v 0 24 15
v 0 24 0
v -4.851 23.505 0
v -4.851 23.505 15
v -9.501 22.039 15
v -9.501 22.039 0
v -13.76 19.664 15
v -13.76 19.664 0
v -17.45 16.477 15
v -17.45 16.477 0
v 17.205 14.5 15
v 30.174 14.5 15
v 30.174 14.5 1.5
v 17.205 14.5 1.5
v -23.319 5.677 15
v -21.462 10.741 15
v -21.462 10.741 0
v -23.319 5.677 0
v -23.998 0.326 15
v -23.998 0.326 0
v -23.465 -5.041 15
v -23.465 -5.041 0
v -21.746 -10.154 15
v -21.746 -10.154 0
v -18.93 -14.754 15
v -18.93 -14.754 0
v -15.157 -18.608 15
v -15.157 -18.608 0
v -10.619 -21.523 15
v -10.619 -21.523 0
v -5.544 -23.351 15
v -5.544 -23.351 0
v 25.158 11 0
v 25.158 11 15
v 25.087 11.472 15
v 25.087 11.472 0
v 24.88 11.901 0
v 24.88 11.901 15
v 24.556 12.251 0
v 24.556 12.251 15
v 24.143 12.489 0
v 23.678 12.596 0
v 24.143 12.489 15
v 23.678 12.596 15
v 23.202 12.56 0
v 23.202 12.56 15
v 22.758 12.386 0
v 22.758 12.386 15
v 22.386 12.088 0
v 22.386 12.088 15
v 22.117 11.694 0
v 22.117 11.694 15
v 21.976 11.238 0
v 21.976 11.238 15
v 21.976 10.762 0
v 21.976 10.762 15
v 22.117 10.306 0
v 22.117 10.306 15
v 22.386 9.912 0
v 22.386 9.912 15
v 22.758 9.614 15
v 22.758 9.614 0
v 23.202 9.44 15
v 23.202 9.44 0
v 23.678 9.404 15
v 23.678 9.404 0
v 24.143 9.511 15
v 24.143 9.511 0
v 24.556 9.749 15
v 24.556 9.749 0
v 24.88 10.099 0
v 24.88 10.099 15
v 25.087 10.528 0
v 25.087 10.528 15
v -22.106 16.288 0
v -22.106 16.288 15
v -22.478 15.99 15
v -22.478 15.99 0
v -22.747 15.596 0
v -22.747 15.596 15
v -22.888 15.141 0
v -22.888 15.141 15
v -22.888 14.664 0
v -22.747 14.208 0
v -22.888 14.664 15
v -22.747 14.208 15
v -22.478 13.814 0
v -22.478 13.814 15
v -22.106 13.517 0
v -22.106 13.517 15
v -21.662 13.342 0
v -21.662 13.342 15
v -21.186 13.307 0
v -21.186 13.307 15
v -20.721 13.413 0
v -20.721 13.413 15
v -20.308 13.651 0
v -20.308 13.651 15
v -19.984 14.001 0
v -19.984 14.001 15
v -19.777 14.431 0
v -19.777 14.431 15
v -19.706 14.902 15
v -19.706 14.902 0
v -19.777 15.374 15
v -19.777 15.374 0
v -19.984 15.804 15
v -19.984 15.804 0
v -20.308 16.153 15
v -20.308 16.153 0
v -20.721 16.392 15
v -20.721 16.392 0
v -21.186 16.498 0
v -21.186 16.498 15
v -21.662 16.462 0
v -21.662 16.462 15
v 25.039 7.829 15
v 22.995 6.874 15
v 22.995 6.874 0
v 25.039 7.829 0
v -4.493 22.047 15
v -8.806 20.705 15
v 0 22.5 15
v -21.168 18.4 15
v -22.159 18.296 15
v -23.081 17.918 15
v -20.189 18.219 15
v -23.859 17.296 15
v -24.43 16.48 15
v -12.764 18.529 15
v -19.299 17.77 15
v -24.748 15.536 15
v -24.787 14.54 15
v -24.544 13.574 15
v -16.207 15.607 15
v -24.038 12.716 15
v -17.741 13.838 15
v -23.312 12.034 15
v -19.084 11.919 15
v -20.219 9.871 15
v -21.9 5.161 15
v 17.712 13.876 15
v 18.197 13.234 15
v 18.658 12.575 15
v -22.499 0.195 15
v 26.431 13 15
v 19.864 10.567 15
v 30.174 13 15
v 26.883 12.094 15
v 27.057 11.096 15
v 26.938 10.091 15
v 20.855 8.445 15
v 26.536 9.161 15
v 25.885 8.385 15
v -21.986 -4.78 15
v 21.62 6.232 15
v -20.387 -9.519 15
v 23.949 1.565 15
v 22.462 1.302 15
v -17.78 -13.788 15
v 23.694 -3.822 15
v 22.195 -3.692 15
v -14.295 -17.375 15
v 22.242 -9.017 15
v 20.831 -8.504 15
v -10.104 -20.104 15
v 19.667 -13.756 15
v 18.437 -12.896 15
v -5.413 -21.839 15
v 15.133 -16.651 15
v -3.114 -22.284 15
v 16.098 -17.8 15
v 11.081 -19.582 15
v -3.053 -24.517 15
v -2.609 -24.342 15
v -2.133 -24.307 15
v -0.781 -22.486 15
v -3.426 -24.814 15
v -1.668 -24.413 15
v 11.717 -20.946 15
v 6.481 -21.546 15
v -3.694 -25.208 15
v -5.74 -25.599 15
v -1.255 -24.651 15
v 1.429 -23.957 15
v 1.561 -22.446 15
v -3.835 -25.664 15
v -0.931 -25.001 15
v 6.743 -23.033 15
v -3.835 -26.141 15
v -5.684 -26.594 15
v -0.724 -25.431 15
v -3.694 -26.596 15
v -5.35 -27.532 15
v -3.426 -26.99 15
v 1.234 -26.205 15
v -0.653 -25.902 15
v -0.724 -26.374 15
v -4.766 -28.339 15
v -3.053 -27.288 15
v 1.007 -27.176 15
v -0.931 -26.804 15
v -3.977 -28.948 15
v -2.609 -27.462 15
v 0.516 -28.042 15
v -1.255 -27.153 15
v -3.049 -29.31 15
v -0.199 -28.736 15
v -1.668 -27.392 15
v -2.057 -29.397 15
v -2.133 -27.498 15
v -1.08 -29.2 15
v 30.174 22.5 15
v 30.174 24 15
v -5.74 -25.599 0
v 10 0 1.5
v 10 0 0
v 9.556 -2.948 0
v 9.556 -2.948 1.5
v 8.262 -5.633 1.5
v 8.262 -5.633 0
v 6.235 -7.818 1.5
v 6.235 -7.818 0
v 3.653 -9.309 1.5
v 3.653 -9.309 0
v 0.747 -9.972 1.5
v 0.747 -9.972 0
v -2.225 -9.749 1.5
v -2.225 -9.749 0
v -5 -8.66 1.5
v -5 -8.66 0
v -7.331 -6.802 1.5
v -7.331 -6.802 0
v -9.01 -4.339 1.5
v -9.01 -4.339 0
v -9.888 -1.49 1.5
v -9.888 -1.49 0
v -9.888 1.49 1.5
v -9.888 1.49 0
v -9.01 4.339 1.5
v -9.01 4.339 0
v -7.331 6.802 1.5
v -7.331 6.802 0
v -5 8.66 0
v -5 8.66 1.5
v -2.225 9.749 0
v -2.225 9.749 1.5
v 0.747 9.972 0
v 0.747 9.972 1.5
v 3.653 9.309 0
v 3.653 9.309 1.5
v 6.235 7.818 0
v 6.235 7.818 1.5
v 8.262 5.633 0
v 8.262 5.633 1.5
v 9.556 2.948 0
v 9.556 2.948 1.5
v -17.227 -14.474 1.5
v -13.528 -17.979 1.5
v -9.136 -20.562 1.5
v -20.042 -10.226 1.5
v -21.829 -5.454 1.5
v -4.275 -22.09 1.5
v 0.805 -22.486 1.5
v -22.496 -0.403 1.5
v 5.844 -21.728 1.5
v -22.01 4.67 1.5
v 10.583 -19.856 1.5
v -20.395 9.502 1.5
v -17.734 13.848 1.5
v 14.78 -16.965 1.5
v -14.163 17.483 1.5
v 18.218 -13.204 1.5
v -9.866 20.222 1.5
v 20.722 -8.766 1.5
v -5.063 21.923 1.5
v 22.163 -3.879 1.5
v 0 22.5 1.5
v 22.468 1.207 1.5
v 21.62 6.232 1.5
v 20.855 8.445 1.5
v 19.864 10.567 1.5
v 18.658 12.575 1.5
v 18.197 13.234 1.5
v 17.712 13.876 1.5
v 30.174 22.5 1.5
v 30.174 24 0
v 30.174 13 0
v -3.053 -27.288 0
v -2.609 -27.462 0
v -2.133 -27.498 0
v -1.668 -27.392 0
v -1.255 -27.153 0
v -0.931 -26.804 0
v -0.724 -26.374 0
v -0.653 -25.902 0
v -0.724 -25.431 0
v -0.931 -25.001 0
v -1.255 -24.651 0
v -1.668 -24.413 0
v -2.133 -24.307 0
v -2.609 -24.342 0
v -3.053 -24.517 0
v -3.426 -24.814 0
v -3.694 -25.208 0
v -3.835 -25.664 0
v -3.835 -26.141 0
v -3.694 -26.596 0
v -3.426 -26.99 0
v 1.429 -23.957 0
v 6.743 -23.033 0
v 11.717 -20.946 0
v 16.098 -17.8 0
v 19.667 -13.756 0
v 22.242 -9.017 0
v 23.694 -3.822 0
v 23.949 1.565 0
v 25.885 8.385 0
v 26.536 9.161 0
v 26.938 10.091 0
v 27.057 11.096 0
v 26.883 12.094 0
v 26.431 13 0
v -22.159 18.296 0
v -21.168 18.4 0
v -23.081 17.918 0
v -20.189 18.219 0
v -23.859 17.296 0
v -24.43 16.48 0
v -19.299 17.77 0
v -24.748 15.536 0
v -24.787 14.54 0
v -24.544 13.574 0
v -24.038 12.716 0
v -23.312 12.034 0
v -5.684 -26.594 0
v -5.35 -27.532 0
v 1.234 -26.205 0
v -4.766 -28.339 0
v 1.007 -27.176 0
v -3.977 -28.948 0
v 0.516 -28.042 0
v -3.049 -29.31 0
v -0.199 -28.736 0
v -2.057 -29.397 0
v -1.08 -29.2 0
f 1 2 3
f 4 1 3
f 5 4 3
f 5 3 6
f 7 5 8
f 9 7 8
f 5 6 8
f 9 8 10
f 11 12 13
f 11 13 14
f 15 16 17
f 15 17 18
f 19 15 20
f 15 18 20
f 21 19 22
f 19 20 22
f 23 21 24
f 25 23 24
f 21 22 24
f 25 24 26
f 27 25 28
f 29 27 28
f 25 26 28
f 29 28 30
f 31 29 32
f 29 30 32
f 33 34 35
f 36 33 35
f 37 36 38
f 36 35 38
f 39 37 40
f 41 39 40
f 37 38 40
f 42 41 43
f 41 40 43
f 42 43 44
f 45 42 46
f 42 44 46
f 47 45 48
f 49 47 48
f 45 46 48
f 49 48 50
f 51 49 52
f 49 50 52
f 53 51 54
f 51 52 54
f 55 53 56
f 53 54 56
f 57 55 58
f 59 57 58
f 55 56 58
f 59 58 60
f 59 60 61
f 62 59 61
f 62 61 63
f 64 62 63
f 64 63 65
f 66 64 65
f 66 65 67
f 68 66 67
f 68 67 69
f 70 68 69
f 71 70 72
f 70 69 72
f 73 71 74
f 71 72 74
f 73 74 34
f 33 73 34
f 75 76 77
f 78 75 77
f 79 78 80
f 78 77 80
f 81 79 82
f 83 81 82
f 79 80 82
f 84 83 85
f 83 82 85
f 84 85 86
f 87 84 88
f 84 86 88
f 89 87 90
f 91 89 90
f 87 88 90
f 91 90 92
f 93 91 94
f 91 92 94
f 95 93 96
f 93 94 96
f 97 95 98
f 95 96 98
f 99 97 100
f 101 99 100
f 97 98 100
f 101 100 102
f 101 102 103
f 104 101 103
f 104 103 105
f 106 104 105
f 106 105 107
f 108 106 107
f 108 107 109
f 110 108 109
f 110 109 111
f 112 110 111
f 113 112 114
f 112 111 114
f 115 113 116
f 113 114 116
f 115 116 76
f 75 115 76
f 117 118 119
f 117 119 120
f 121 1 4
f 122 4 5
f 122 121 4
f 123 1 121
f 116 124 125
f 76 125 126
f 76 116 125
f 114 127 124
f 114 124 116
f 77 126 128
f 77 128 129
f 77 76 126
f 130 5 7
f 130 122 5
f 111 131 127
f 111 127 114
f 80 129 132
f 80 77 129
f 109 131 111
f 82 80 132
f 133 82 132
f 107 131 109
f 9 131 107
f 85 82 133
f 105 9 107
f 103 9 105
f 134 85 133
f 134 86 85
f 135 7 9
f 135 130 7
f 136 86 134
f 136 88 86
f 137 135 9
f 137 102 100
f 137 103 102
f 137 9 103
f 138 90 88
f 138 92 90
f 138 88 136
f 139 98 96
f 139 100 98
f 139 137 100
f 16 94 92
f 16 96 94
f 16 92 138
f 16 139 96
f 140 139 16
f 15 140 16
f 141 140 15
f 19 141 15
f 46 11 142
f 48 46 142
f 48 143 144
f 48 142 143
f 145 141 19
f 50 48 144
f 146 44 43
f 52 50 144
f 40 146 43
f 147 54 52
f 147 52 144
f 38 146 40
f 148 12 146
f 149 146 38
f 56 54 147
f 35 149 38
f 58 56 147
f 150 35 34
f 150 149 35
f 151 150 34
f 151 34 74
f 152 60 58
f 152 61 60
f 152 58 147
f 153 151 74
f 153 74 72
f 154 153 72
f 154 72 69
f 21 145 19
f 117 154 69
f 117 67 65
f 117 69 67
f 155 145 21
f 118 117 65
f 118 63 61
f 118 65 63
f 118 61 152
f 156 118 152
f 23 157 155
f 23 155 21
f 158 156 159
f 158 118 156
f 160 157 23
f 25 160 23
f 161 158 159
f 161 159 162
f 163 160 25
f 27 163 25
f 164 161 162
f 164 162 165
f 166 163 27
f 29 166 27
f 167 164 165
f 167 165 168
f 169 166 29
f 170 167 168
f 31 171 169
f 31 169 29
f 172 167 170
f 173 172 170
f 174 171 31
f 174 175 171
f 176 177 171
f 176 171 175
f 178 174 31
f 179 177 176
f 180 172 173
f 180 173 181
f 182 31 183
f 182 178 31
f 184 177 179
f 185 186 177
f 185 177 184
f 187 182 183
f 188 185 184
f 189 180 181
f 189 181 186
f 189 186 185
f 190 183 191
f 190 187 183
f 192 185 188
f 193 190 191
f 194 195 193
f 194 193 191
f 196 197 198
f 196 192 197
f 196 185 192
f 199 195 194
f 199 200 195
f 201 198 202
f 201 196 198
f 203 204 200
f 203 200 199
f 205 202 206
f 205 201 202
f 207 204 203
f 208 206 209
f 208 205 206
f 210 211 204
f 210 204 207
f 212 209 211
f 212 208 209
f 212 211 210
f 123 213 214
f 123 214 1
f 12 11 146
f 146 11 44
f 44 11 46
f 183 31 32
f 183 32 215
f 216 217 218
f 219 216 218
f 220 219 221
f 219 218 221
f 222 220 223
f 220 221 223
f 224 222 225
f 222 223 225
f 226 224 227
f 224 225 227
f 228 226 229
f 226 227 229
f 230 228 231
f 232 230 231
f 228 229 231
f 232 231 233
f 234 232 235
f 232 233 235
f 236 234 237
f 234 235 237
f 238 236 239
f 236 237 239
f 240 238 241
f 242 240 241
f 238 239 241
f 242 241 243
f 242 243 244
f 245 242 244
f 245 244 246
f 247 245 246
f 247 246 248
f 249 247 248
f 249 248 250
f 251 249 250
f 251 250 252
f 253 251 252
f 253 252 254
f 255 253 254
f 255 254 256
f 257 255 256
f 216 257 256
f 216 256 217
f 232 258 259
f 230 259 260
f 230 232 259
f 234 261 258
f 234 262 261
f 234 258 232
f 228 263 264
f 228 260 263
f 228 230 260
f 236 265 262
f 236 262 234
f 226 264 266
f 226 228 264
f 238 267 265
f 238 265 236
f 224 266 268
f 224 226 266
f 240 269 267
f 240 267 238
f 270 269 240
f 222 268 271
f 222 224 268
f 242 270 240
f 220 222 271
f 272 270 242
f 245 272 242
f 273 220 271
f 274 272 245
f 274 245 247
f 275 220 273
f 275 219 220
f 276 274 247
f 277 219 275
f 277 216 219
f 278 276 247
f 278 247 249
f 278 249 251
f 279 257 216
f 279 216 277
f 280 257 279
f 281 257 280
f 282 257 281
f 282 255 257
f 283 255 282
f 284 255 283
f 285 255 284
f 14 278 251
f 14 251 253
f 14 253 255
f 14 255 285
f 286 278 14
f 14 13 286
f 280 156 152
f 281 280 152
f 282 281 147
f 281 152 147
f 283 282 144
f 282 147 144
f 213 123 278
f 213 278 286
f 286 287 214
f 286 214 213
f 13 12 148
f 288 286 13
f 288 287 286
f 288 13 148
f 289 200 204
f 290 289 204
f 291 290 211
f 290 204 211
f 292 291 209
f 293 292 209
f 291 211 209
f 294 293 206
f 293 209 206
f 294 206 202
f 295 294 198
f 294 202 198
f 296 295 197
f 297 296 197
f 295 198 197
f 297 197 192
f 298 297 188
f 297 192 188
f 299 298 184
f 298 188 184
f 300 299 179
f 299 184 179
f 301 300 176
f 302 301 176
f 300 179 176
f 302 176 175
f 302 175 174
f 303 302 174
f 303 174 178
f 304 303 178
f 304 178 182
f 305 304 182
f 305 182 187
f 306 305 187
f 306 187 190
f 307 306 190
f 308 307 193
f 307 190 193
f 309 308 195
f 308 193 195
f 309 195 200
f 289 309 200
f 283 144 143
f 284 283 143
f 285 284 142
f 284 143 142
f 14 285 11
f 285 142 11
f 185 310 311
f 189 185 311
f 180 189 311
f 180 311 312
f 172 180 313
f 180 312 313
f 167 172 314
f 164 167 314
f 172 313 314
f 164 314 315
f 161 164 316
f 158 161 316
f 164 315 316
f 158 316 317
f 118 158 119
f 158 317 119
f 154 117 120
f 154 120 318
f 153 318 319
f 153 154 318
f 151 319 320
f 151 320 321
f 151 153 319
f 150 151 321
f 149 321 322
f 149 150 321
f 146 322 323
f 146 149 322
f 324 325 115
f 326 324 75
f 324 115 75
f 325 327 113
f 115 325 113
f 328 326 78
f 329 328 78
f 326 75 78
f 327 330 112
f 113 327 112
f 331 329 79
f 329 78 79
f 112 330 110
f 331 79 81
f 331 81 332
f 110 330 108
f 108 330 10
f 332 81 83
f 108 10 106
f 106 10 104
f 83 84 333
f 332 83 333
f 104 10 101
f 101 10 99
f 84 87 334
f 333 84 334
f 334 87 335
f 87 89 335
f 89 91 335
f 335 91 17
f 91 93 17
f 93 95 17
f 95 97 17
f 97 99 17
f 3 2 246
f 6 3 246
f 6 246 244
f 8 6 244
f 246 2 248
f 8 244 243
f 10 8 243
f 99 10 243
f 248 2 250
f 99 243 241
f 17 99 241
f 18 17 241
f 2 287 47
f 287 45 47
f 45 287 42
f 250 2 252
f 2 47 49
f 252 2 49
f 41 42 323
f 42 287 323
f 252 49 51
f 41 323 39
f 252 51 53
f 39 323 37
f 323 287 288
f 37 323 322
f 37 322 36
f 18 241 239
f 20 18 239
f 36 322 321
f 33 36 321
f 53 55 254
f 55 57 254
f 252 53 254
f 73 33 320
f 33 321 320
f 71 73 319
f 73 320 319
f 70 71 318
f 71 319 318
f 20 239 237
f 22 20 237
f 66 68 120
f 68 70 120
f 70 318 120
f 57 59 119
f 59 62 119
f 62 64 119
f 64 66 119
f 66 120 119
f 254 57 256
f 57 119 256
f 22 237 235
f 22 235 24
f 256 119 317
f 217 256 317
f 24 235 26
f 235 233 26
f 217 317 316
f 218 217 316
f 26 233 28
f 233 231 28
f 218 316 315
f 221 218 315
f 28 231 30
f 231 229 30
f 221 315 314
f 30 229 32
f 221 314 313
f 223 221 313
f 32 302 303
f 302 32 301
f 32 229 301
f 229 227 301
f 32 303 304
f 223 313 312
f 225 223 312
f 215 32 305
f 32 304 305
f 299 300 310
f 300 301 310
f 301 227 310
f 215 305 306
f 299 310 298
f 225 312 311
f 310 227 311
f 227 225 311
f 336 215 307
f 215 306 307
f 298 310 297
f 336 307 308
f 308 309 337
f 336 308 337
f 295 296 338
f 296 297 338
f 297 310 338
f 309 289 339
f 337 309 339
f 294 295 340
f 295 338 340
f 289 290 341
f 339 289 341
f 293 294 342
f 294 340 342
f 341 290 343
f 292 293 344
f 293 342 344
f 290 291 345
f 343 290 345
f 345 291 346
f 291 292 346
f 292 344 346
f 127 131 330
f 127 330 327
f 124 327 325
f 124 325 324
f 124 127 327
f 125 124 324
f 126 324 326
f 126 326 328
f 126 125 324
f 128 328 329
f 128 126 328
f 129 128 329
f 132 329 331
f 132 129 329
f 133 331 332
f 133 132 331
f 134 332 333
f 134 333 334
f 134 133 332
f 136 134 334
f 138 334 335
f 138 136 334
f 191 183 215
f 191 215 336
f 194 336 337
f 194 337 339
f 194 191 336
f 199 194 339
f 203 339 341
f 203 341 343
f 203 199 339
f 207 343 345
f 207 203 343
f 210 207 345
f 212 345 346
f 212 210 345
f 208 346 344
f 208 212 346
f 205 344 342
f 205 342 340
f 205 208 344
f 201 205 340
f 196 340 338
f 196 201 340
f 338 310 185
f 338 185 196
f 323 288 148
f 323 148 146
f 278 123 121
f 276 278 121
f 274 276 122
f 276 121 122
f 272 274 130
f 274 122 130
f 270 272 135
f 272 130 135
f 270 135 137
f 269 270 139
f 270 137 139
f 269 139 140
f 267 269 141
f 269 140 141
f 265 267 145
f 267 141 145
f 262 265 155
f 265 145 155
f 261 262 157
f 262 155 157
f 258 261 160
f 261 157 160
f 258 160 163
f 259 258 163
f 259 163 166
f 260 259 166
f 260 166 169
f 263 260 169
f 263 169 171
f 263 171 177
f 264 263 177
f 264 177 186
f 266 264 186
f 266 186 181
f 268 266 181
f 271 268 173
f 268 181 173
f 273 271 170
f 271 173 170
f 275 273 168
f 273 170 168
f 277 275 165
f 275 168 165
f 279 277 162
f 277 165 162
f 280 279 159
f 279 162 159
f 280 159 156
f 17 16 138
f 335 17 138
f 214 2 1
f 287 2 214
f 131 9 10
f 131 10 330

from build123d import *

# Parameters (mm, degrees)
PAD_DEPTH             = 15
POCKET_DEPTH          = 13.5
PAD001_DEPTH          = 15
POLARPATTERN_COUNT    = 3
SKETCH008_R           = 1.6
POCKET001_DEPTH       = 15
POLARPATTERN001_COUNT = 3
SKETCH009_R           = 10
POCKET002_DEPTH       = 5


with BuildPart() as part:
    # Sketch → Pad (new body)
    with BuildSketch(Plane.XY):
        with BuildLine():
            ThreePointArc((0, 24), (-11.489125, -21.071308), (20.174241, 13))
            Line((30.174241, 13), (20.174241, 13))
            Line((30.174241, 24), (30.174241, 13))
            Line((0, 24), (30.174241, 24))
        make_face()
    extrude(amount=PAD_DEPTH)

    # Sketch001 → Pocket (cut)
    with BuildSketch(Plane.XY.offset(15)):
        with BuildLine():
            ThreePointArc((0, 22.5), (-9.486833, -20.402206), (17.204651, 14.5))
            Line((30.174241, 14.5), (17.204651, 14.5))
            Line((30.174241, 22.5), (30.174241, 14.5))
            Line((0, 22.5), (30.174241, 22.5))
        make_face()
    extrude(amount=-POCKET_DEPTH, mode=Mode.SUBTRACT)

    # Sketch007 → Pad001 (new body)
    with BuildSketch(Plane.XY.offset(15)):
        with BuildLine():
            ThreePointArc((25.039208, 7.828671), (26.72977, 12.480769), (22.07767, 14.171327))
            Line((18.658172, 12.574682), (22.07767, 14.171327))
            ThreePointArc((21.61971, 6.232025), (20.38711, 9.519229), (18.658172, 12.574682))
            Line((21.61971, 6.232025), (25.039208, 7.828671))
        make_face()
    pad001 = extrude(amount=-PAD001_DEPTH)

    # PolarPattern: Pad001 ×3 about axis
    polarpattern_axis = Axis((0, 0, 15), (0, 0, 1))
    for i in range(1, POLARPATTERN_COUNT):
        add(pad001.rotate(polarpattern_axis, i * 360 / POLARPATTERN_COUNT))

    # Sketch008 → Pocket001 (cut)
    with BuildSketch(Plane.XY.offset(15)):
        with Locations((23.558442, 11)):
            Circle(SKETCH008_R)
    pocket001 = extrude(amount=-POCKET001_DEPTH, mode=Mode.SUBTRACT)

    # PolarPattern001: Pocket001 ×3 about axis
    polarpattern001_axis = Axis((0, 0, 15), (0, 0, 1))
    for i in range(1, POLARPATTERN001_COUNT):
        add(pocket001.rotate(polarpattern001_axis, i * 360 / POLARPATTERN001_COUNT), mode=Mode.SUBTRACT)

    # Sketch009 → Pocket002 (cut)
    with BuildSketch(Plane(origin=(0, 0, 0), x_dir=(1, 0, 0), z_dir=(0, 0, -1))):
        Circle(SKETCH009_R)
    extrude(amount=-POCKET002_DEPTH, mode=Mode.SUBTRACT)


solid = part.part
